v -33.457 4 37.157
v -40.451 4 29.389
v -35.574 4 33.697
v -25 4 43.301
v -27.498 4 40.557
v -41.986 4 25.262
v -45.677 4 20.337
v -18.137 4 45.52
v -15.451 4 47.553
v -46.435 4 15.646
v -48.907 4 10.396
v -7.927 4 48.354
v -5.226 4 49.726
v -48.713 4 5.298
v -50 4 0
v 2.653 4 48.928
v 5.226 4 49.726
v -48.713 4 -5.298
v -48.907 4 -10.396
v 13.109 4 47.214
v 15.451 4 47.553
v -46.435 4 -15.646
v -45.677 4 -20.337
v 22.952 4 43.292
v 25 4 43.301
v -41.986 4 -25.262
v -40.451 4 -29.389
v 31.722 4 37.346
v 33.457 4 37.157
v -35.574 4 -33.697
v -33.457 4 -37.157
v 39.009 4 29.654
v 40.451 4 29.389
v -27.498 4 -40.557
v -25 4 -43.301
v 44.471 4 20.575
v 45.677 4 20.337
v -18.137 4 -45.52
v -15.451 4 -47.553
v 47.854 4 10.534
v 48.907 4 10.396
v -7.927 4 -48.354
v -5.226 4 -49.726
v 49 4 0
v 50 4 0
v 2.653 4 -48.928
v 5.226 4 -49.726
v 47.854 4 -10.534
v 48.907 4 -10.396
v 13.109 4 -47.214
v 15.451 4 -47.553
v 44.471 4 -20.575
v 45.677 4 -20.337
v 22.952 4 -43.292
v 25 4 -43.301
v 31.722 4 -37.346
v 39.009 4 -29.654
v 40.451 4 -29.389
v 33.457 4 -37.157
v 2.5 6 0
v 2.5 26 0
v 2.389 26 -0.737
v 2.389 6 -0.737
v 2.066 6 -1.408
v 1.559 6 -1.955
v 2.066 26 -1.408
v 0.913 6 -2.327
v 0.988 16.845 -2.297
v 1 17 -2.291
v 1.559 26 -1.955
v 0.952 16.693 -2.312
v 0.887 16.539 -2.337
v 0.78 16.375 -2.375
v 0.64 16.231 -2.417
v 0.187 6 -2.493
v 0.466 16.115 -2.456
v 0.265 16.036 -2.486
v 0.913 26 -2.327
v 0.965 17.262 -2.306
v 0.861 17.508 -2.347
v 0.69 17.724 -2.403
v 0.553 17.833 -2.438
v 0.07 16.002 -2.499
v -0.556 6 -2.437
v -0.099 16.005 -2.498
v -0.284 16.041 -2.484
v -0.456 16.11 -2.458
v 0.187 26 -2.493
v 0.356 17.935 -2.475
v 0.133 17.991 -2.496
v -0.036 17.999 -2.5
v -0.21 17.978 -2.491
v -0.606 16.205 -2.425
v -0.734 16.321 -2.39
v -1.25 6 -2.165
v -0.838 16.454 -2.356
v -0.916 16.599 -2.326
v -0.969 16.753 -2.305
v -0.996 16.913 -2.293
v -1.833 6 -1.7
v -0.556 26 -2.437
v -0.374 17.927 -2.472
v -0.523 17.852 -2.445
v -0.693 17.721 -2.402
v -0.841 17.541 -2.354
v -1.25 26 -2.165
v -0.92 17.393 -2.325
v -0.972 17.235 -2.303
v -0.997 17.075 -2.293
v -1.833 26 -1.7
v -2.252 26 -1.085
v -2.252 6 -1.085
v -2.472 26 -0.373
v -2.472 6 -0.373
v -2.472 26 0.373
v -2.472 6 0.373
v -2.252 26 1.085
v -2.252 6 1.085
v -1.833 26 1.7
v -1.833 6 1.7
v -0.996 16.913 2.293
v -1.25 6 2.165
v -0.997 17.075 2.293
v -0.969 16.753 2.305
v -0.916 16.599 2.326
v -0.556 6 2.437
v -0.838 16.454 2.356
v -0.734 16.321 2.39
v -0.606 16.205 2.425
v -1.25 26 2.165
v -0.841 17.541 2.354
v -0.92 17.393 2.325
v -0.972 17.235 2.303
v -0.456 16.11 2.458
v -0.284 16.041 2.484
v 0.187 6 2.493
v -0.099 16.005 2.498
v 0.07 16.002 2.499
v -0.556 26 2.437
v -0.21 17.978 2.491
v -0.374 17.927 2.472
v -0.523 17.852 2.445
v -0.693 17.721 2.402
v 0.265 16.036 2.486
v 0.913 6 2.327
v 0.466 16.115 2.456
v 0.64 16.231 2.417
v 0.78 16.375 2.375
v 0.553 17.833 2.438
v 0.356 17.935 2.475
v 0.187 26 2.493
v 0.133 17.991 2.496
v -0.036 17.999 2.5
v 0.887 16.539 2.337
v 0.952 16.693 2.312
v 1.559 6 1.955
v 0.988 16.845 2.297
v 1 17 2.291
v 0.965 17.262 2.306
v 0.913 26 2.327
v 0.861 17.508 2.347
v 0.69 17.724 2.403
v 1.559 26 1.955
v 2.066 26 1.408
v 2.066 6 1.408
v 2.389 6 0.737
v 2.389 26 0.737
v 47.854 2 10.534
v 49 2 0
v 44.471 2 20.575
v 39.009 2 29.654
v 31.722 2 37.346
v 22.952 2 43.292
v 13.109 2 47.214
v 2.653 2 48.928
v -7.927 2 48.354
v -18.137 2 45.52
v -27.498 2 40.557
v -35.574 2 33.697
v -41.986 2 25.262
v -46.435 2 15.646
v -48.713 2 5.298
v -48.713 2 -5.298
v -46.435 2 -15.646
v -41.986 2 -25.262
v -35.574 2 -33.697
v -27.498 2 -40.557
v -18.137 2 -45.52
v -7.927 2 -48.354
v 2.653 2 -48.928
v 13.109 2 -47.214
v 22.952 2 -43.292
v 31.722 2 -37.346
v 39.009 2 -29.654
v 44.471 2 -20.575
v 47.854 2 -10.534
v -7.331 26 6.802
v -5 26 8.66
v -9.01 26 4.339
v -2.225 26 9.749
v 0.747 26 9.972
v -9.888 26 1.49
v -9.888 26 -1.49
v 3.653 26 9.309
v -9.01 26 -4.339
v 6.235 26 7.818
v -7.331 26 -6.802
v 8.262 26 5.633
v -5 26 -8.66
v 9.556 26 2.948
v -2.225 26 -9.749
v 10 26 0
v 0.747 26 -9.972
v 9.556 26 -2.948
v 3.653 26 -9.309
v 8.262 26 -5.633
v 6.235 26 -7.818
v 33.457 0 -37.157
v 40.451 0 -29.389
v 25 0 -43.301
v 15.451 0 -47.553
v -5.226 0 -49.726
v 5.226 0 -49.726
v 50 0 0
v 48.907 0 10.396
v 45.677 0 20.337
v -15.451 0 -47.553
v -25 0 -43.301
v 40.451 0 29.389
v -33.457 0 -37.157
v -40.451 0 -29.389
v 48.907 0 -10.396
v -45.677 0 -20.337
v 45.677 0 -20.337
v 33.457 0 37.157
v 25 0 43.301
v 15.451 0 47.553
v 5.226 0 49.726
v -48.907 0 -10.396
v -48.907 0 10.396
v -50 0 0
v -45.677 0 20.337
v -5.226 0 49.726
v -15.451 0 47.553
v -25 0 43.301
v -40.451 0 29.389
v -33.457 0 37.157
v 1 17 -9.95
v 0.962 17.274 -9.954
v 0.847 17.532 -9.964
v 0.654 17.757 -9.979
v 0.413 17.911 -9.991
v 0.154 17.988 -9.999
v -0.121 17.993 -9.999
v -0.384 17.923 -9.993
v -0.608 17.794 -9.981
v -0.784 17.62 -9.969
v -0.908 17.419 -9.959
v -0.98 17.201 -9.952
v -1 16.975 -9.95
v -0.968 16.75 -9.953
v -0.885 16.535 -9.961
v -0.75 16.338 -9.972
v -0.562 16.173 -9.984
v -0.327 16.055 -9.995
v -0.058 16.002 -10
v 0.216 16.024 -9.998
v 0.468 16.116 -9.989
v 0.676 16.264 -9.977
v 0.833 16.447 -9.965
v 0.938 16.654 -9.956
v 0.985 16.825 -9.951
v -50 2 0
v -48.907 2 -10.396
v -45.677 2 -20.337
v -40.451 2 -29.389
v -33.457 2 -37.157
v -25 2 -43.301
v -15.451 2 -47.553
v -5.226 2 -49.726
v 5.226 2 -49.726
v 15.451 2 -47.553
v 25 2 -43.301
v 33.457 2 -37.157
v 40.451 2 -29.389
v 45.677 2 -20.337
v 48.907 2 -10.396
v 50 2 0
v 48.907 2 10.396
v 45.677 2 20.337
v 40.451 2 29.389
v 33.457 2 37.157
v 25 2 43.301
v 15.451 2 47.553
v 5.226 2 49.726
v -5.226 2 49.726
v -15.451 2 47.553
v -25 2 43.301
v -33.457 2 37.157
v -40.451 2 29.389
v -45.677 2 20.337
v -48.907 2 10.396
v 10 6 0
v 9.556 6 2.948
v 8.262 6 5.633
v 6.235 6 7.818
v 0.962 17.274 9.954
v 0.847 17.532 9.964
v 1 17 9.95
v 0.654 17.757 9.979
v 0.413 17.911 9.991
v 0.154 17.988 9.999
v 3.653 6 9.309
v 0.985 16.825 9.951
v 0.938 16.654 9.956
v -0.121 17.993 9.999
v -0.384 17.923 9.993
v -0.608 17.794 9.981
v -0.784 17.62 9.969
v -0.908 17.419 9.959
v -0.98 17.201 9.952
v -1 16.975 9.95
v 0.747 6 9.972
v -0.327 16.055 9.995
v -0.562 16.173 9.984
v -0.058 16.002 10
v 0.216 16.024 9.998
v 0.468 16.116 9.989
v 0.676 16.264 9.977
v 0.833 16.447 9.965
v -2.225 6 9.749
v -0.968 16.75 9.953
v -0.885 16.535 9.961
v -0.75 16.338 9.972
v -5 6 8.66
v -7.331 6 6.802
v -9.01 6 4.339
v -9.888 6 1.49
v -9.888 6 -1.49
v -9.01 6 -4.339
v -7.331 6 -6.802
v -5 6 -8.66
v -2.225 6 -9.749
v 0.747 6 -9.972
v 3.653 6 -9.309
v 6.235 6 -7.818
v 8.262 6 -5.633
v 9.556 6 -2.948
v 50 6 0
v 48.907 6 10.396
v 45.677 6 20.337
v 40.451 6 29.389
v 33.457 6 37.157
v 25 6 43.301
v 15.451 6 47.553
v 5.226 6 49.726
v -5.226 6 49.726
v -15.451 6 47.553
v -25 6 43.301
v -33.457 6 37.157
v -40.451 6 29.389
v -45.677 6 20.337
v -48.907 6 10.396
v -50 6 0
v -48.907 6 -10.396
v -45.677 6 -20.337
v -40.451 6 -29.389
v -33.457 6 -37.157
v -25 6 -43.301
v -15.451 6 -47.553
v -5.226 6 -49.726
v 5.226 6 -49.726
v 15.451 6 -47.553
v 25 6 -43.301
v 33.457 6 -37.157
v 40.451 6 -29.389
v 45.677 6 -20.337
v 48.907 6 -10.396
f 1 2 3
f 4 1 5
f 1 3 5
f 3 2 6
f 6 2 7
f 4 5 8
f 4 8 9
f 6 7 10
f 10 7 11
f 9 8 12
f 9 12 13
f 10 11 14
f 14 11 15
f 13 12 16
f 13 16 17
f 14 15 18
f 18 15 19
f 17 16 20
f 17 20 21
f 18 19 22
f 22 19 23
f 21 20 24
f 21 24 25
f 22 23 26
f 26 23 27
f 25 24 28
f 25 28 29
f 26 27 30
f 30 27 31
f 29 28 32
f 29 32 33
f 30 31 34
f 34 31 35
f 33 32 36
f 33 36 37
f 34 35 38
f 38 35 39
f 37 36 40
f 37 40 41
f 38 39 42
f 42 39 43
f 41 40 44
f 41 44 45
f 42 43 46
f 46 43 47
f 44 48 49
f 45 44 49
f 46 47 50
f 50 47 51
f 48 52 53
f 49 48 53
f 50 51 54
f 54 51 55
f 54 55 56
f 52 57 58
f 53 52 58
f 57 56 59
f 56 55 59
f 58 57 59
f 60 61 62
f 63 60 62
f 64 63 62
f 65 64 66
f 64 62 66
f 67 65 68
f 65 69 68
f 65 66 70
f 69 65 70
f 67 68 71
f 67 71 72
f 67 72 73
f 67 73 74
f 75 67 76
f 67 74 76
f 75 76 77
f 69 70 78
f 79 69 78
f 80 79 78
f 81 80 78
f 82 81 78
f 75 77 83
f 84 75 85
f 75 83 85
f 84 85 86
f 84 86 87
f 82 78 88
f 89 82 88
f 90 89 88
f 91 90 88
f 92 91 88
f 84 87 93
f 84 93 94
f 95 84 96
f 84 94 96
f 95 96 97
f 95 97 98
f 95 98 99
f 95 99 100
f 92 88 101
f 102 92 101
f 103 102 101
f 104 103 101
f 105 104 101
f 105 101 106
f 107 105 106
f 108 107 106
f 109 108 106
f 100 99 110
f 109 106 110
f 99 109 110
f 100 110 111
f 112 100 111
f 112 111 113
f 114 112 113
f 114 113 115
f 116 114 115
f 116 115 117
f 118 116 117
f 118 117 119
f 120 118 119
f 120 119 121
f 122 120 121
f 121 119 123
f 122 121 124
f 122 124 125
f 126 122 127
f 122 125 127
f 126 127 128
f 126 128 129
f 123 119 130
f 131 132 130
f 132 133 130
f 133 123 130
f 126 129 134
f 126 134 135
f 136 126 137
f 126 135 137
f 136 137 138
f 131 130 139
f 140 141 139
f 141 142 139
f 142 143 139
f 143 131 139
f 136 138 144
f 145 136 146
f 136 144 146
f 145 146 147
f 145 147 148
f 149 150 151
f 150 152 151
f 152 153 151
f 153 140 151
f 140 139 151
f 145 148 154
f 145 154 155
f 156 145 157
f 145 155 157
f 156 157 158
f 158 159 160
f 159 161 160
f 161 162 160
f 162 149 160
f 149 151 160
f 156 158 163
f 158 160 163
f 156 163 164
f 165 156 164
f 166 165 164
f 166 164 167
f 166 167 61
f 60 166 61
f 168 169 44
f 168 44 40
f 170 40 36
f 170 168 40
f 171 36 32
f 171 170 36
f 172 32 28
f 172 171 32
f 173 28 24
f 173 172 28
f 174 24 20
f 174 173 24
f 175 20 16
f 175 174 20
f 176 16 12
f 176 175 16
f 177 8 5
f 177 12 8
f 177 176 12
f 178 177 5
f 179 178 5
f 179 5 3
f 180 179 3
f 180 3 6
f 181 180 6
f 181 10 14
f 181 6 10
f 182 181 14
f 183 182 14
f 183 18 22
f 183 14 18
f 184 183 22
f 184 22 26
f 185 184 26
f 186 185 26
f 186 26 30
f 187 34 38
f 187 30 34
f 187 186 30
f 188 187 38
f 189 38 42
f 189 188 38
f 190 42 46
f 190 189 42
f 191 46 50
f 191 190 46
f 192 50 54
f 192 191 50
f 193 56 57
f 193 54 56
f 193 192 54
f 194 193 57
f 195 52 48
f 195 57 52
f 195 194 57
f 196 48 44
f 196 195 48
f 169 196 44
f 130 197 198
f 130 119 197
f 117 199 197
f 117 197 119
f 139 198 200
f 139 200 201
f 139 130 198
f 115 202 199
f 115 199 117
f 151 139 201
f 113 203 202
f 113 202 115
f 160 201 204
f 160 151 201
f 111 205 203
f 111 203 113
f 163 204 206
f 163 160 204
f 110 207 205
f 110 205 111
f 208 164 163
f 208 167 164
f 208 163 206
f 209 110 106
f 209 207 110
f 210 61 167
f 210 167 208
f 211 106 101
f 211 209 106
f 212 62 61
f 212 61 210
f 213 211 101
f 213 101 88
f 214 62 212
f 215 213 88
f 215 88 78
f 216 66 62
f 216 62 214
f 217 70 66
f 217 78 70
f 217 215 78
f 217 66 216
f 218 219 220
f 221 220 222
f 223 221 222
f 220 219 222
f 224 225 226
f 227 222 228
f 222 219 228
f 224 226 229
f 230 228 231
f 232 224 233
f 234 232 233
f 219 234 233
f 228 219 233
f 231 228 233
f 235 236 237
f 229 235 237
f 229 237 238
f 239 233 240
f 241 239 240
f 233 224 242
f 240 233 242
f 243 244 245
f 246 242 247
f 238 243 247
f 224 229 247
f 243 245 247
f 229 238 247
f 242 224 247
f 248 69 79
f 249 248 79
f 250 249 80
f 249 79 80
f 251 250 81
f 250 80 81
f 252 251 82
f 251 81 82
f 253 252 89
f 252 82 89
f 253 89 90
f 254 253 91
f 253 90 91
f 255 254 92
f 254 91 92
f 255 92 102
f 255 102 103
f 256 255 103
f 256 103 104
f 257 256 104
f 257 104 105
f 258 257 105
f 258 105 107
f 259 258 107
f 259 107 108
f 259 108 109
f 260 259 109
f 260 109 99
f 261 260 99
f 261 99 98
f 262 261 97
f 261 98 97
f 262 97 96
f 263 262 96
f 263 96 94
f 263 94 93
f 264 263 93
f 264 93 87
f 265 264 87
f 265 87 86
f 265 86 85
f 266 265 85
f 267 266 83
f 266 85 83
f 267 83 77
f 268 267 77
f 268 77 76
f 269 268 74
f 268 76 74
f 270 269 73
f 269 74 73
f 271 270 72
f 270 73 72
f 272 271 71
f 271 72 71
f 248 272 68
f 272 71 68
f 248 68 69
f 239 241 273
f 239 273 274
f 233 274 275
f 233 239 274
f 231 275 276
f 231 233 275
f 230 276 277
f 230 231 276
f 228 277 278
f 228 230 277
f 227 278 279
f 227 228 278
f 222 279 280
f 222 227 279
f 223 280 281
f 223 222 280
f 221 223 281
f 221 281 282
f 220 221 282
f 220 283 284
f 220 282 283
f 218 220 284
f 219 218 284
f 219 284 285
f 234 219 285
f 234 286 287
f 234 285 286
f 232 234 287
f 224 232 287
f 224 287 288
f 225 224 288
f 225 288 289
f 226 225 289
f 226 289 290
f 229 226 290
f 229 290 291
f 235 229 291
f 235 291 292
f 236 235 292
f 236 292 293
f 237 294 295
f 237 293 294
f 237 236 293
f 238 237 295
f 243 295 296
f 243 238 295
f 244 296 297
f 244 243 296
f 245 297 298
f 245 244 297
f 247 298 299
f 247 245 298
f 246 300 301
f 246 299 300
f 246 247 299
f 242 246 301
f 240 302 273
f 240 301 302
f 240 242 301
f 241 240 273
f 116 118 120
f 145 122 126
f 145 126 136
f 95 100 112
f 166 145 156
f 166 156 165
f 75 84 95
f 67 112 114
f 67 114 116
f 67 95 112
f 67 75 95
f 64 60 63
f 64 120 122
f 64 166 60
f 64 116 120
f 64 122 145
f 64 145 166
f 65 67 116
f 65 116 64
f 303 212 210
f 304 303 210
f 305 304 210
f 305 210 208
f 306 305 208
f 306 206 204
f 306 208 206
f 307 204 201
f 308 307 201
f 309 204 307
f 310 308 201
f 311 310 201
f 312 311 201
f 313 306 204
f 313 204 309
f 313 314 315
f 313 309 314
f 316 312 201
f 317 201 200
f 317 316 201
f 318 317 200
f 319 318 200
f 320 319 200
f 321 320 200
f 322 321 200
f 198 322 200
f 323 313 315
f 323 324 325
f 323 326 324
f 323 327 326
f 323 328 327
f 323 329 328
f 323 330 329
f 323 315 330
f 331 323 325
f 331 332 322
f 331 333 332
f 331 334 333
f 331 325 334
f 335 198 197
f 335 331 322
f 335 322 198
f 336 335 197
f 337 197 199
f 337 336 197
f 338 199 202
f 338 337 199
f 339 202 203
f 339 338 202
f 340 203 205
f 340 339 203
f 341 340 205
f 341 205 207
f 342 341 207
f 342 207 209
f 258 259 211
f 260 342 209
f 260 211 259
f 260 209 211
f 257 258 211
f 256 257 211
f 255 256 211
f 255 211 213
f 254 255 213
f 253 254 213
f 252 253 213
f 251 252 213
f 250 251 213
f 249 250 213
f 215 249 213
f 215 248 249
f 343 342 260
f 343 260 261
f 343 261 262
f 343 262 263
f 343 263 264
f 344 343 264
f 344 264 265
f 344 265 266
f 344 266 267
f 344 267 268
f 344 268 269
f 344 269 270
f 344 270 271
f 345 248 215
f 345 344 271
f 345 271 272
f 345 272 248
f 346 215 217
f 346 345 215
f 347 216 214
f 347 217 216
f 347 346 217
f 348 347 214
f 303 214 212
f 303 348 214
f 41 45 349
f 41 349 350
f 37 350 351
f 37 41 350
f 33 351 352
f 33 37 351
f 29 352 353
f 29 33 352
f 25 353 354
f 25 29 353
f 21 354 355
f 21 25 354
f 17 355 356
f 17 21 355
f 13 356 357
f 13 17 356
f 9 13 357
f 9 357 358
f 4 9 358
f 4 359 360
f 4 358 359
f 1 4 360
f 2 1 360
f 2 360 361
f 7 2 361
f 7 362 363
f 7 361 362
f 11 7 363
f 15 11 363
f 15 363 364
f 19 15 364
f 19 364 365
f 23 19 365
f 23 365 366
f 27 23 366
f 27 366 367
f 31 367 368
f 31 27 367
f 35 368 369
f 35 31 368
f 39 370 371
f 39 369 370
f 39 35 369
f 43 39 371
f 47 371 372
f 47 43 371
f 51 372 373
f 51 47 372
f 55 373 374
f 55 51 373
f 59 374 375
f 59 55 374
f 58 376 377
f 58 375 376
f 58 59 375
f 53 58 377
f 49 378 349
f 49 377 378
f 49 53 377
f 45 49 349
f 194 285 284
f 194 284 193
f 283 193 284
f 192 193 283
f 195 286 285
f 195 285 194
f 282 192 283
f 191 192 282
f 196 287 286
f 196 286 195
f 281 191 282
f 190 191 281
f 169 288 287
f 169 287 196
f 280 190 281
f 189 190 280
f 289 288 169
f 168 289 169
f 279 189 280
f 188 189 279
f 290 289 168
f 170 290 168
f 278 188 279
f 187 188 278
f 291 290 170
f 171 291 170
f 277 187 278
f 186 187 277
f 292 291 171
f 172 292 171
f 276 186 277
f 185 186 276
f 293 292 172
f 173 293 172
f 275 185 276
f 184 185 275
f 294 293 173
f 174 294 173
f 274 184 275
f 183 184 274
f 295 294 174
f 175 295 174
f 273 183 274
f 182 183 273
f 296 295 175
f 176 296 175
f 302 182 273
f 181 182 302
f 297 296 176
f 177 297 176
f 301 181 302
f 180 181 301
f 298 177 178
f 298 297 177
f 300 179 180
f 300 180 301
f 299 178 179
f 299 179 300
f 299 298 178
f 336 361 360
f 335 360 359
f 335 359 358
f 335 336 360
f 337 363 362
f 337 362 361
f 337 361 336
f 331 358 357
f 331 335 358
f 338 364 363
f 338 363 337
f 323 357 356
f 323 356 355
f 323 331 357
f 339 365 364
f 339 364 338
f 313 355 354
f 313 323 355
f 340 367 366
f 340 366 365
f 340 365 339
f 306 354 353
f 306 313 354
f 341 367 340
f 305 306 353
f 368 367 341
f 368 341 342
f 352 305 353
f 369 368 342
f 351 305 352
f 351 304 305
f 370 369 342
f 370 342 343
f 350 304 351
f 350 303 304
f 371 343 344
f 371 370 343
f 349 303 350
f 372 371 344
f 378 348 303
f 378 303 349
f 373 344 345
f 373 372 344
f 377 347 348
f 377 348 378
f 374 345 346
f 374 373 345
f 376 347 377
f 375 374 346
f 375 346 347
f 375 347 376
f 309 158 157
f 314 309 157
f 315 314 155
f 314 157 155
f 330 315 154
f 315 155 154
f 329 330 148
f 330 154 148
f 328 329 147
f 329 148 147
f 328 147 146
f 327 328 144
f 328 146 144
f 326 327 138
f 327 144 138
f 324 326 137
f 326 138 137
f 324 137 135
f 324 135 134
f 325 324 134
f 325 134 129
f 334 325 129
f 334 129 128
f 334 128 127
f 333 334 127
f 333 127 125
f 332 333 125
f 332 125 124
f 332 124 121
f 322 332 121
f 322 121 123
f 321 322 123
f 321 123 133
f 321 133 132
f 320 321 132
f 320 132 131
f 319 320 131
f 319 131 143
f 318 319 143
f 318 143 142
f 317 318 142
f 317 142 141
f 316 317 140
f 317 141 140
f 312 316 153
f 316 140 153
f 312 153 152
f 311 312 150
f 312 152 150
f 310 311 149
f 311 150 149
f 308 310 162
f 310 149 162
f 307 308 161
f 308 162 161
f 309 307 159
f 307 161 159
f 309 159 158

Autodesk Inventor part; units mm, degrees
ref_plane "YZ Plane" through (0, 0, 0) normal (1, 0, 0) x (0, 1, 0)
ref_plane "XZ Plane" through (0, 0, 0) normal (0, 1, 0) x (-1, 0, 0)
ref_plane "XY Plane" through (0, 0, 0) normal (0, 0, 1) x (1, 0, 0)
sketch "Sketch1" plane through (0, 0, 0) normal (0, 1, 0) x (-1, 0, 0)
  circle A0 centre (0, 0) radius 50
  dimension "d0" = 100
extrude "Extrusion1" add sketch "Sketch1" along normal blind 2
sketch "Sketch2" plane through (0, 2, 0) normal (0, 1, 0) x (1, 0, 0)
  circle A0 centre (0, 0) radius 49
  dimension "d3" = 98
extrude "Extrusion2" add sketch "Sketch2" along normal blind 2
sketch "Sketch3" plane through (0, 4, 0) normal (0, 1, 0) x (1, 0, 0)
  circle A0 centre (0, 0) radius 50
  dimension "d6" = 100
extrude "Extrusion3" add sketch "Sketch3" along normal blind 2
sketch "Sketch4" plane through (0, 6, 0) normal (0, 1, 0) x (1, 0, 0)
  circle A0 centre (0, 0) radius 10
  dimension "d9" = 20
extrude "Extrusion4" add sketch "Sketch4" along normal blind 20
sketch "Sketch5" plane through (0, 0, 0) normal (0, 0, 1) x (1, 0, 0)
  circle A0 centre (0, 17) radius 1
  point P0 (0, 0)
  dimension "d12" = 2
extrude "Extrusion5" cut sketch "Sketch5" along normal mid plane 25
sketch "Sketch6" plane through (0, 26, 0) normal (0, 1, 0) x (1, 0, 0)
  circle A0 centre (0, 0) radius 2.5
  dimension "d15" = 5
extrude "Extrusion6" cut sketch "Sketch6" against normal blind 20
properties part number "trail 4" material "Polypropylene"
